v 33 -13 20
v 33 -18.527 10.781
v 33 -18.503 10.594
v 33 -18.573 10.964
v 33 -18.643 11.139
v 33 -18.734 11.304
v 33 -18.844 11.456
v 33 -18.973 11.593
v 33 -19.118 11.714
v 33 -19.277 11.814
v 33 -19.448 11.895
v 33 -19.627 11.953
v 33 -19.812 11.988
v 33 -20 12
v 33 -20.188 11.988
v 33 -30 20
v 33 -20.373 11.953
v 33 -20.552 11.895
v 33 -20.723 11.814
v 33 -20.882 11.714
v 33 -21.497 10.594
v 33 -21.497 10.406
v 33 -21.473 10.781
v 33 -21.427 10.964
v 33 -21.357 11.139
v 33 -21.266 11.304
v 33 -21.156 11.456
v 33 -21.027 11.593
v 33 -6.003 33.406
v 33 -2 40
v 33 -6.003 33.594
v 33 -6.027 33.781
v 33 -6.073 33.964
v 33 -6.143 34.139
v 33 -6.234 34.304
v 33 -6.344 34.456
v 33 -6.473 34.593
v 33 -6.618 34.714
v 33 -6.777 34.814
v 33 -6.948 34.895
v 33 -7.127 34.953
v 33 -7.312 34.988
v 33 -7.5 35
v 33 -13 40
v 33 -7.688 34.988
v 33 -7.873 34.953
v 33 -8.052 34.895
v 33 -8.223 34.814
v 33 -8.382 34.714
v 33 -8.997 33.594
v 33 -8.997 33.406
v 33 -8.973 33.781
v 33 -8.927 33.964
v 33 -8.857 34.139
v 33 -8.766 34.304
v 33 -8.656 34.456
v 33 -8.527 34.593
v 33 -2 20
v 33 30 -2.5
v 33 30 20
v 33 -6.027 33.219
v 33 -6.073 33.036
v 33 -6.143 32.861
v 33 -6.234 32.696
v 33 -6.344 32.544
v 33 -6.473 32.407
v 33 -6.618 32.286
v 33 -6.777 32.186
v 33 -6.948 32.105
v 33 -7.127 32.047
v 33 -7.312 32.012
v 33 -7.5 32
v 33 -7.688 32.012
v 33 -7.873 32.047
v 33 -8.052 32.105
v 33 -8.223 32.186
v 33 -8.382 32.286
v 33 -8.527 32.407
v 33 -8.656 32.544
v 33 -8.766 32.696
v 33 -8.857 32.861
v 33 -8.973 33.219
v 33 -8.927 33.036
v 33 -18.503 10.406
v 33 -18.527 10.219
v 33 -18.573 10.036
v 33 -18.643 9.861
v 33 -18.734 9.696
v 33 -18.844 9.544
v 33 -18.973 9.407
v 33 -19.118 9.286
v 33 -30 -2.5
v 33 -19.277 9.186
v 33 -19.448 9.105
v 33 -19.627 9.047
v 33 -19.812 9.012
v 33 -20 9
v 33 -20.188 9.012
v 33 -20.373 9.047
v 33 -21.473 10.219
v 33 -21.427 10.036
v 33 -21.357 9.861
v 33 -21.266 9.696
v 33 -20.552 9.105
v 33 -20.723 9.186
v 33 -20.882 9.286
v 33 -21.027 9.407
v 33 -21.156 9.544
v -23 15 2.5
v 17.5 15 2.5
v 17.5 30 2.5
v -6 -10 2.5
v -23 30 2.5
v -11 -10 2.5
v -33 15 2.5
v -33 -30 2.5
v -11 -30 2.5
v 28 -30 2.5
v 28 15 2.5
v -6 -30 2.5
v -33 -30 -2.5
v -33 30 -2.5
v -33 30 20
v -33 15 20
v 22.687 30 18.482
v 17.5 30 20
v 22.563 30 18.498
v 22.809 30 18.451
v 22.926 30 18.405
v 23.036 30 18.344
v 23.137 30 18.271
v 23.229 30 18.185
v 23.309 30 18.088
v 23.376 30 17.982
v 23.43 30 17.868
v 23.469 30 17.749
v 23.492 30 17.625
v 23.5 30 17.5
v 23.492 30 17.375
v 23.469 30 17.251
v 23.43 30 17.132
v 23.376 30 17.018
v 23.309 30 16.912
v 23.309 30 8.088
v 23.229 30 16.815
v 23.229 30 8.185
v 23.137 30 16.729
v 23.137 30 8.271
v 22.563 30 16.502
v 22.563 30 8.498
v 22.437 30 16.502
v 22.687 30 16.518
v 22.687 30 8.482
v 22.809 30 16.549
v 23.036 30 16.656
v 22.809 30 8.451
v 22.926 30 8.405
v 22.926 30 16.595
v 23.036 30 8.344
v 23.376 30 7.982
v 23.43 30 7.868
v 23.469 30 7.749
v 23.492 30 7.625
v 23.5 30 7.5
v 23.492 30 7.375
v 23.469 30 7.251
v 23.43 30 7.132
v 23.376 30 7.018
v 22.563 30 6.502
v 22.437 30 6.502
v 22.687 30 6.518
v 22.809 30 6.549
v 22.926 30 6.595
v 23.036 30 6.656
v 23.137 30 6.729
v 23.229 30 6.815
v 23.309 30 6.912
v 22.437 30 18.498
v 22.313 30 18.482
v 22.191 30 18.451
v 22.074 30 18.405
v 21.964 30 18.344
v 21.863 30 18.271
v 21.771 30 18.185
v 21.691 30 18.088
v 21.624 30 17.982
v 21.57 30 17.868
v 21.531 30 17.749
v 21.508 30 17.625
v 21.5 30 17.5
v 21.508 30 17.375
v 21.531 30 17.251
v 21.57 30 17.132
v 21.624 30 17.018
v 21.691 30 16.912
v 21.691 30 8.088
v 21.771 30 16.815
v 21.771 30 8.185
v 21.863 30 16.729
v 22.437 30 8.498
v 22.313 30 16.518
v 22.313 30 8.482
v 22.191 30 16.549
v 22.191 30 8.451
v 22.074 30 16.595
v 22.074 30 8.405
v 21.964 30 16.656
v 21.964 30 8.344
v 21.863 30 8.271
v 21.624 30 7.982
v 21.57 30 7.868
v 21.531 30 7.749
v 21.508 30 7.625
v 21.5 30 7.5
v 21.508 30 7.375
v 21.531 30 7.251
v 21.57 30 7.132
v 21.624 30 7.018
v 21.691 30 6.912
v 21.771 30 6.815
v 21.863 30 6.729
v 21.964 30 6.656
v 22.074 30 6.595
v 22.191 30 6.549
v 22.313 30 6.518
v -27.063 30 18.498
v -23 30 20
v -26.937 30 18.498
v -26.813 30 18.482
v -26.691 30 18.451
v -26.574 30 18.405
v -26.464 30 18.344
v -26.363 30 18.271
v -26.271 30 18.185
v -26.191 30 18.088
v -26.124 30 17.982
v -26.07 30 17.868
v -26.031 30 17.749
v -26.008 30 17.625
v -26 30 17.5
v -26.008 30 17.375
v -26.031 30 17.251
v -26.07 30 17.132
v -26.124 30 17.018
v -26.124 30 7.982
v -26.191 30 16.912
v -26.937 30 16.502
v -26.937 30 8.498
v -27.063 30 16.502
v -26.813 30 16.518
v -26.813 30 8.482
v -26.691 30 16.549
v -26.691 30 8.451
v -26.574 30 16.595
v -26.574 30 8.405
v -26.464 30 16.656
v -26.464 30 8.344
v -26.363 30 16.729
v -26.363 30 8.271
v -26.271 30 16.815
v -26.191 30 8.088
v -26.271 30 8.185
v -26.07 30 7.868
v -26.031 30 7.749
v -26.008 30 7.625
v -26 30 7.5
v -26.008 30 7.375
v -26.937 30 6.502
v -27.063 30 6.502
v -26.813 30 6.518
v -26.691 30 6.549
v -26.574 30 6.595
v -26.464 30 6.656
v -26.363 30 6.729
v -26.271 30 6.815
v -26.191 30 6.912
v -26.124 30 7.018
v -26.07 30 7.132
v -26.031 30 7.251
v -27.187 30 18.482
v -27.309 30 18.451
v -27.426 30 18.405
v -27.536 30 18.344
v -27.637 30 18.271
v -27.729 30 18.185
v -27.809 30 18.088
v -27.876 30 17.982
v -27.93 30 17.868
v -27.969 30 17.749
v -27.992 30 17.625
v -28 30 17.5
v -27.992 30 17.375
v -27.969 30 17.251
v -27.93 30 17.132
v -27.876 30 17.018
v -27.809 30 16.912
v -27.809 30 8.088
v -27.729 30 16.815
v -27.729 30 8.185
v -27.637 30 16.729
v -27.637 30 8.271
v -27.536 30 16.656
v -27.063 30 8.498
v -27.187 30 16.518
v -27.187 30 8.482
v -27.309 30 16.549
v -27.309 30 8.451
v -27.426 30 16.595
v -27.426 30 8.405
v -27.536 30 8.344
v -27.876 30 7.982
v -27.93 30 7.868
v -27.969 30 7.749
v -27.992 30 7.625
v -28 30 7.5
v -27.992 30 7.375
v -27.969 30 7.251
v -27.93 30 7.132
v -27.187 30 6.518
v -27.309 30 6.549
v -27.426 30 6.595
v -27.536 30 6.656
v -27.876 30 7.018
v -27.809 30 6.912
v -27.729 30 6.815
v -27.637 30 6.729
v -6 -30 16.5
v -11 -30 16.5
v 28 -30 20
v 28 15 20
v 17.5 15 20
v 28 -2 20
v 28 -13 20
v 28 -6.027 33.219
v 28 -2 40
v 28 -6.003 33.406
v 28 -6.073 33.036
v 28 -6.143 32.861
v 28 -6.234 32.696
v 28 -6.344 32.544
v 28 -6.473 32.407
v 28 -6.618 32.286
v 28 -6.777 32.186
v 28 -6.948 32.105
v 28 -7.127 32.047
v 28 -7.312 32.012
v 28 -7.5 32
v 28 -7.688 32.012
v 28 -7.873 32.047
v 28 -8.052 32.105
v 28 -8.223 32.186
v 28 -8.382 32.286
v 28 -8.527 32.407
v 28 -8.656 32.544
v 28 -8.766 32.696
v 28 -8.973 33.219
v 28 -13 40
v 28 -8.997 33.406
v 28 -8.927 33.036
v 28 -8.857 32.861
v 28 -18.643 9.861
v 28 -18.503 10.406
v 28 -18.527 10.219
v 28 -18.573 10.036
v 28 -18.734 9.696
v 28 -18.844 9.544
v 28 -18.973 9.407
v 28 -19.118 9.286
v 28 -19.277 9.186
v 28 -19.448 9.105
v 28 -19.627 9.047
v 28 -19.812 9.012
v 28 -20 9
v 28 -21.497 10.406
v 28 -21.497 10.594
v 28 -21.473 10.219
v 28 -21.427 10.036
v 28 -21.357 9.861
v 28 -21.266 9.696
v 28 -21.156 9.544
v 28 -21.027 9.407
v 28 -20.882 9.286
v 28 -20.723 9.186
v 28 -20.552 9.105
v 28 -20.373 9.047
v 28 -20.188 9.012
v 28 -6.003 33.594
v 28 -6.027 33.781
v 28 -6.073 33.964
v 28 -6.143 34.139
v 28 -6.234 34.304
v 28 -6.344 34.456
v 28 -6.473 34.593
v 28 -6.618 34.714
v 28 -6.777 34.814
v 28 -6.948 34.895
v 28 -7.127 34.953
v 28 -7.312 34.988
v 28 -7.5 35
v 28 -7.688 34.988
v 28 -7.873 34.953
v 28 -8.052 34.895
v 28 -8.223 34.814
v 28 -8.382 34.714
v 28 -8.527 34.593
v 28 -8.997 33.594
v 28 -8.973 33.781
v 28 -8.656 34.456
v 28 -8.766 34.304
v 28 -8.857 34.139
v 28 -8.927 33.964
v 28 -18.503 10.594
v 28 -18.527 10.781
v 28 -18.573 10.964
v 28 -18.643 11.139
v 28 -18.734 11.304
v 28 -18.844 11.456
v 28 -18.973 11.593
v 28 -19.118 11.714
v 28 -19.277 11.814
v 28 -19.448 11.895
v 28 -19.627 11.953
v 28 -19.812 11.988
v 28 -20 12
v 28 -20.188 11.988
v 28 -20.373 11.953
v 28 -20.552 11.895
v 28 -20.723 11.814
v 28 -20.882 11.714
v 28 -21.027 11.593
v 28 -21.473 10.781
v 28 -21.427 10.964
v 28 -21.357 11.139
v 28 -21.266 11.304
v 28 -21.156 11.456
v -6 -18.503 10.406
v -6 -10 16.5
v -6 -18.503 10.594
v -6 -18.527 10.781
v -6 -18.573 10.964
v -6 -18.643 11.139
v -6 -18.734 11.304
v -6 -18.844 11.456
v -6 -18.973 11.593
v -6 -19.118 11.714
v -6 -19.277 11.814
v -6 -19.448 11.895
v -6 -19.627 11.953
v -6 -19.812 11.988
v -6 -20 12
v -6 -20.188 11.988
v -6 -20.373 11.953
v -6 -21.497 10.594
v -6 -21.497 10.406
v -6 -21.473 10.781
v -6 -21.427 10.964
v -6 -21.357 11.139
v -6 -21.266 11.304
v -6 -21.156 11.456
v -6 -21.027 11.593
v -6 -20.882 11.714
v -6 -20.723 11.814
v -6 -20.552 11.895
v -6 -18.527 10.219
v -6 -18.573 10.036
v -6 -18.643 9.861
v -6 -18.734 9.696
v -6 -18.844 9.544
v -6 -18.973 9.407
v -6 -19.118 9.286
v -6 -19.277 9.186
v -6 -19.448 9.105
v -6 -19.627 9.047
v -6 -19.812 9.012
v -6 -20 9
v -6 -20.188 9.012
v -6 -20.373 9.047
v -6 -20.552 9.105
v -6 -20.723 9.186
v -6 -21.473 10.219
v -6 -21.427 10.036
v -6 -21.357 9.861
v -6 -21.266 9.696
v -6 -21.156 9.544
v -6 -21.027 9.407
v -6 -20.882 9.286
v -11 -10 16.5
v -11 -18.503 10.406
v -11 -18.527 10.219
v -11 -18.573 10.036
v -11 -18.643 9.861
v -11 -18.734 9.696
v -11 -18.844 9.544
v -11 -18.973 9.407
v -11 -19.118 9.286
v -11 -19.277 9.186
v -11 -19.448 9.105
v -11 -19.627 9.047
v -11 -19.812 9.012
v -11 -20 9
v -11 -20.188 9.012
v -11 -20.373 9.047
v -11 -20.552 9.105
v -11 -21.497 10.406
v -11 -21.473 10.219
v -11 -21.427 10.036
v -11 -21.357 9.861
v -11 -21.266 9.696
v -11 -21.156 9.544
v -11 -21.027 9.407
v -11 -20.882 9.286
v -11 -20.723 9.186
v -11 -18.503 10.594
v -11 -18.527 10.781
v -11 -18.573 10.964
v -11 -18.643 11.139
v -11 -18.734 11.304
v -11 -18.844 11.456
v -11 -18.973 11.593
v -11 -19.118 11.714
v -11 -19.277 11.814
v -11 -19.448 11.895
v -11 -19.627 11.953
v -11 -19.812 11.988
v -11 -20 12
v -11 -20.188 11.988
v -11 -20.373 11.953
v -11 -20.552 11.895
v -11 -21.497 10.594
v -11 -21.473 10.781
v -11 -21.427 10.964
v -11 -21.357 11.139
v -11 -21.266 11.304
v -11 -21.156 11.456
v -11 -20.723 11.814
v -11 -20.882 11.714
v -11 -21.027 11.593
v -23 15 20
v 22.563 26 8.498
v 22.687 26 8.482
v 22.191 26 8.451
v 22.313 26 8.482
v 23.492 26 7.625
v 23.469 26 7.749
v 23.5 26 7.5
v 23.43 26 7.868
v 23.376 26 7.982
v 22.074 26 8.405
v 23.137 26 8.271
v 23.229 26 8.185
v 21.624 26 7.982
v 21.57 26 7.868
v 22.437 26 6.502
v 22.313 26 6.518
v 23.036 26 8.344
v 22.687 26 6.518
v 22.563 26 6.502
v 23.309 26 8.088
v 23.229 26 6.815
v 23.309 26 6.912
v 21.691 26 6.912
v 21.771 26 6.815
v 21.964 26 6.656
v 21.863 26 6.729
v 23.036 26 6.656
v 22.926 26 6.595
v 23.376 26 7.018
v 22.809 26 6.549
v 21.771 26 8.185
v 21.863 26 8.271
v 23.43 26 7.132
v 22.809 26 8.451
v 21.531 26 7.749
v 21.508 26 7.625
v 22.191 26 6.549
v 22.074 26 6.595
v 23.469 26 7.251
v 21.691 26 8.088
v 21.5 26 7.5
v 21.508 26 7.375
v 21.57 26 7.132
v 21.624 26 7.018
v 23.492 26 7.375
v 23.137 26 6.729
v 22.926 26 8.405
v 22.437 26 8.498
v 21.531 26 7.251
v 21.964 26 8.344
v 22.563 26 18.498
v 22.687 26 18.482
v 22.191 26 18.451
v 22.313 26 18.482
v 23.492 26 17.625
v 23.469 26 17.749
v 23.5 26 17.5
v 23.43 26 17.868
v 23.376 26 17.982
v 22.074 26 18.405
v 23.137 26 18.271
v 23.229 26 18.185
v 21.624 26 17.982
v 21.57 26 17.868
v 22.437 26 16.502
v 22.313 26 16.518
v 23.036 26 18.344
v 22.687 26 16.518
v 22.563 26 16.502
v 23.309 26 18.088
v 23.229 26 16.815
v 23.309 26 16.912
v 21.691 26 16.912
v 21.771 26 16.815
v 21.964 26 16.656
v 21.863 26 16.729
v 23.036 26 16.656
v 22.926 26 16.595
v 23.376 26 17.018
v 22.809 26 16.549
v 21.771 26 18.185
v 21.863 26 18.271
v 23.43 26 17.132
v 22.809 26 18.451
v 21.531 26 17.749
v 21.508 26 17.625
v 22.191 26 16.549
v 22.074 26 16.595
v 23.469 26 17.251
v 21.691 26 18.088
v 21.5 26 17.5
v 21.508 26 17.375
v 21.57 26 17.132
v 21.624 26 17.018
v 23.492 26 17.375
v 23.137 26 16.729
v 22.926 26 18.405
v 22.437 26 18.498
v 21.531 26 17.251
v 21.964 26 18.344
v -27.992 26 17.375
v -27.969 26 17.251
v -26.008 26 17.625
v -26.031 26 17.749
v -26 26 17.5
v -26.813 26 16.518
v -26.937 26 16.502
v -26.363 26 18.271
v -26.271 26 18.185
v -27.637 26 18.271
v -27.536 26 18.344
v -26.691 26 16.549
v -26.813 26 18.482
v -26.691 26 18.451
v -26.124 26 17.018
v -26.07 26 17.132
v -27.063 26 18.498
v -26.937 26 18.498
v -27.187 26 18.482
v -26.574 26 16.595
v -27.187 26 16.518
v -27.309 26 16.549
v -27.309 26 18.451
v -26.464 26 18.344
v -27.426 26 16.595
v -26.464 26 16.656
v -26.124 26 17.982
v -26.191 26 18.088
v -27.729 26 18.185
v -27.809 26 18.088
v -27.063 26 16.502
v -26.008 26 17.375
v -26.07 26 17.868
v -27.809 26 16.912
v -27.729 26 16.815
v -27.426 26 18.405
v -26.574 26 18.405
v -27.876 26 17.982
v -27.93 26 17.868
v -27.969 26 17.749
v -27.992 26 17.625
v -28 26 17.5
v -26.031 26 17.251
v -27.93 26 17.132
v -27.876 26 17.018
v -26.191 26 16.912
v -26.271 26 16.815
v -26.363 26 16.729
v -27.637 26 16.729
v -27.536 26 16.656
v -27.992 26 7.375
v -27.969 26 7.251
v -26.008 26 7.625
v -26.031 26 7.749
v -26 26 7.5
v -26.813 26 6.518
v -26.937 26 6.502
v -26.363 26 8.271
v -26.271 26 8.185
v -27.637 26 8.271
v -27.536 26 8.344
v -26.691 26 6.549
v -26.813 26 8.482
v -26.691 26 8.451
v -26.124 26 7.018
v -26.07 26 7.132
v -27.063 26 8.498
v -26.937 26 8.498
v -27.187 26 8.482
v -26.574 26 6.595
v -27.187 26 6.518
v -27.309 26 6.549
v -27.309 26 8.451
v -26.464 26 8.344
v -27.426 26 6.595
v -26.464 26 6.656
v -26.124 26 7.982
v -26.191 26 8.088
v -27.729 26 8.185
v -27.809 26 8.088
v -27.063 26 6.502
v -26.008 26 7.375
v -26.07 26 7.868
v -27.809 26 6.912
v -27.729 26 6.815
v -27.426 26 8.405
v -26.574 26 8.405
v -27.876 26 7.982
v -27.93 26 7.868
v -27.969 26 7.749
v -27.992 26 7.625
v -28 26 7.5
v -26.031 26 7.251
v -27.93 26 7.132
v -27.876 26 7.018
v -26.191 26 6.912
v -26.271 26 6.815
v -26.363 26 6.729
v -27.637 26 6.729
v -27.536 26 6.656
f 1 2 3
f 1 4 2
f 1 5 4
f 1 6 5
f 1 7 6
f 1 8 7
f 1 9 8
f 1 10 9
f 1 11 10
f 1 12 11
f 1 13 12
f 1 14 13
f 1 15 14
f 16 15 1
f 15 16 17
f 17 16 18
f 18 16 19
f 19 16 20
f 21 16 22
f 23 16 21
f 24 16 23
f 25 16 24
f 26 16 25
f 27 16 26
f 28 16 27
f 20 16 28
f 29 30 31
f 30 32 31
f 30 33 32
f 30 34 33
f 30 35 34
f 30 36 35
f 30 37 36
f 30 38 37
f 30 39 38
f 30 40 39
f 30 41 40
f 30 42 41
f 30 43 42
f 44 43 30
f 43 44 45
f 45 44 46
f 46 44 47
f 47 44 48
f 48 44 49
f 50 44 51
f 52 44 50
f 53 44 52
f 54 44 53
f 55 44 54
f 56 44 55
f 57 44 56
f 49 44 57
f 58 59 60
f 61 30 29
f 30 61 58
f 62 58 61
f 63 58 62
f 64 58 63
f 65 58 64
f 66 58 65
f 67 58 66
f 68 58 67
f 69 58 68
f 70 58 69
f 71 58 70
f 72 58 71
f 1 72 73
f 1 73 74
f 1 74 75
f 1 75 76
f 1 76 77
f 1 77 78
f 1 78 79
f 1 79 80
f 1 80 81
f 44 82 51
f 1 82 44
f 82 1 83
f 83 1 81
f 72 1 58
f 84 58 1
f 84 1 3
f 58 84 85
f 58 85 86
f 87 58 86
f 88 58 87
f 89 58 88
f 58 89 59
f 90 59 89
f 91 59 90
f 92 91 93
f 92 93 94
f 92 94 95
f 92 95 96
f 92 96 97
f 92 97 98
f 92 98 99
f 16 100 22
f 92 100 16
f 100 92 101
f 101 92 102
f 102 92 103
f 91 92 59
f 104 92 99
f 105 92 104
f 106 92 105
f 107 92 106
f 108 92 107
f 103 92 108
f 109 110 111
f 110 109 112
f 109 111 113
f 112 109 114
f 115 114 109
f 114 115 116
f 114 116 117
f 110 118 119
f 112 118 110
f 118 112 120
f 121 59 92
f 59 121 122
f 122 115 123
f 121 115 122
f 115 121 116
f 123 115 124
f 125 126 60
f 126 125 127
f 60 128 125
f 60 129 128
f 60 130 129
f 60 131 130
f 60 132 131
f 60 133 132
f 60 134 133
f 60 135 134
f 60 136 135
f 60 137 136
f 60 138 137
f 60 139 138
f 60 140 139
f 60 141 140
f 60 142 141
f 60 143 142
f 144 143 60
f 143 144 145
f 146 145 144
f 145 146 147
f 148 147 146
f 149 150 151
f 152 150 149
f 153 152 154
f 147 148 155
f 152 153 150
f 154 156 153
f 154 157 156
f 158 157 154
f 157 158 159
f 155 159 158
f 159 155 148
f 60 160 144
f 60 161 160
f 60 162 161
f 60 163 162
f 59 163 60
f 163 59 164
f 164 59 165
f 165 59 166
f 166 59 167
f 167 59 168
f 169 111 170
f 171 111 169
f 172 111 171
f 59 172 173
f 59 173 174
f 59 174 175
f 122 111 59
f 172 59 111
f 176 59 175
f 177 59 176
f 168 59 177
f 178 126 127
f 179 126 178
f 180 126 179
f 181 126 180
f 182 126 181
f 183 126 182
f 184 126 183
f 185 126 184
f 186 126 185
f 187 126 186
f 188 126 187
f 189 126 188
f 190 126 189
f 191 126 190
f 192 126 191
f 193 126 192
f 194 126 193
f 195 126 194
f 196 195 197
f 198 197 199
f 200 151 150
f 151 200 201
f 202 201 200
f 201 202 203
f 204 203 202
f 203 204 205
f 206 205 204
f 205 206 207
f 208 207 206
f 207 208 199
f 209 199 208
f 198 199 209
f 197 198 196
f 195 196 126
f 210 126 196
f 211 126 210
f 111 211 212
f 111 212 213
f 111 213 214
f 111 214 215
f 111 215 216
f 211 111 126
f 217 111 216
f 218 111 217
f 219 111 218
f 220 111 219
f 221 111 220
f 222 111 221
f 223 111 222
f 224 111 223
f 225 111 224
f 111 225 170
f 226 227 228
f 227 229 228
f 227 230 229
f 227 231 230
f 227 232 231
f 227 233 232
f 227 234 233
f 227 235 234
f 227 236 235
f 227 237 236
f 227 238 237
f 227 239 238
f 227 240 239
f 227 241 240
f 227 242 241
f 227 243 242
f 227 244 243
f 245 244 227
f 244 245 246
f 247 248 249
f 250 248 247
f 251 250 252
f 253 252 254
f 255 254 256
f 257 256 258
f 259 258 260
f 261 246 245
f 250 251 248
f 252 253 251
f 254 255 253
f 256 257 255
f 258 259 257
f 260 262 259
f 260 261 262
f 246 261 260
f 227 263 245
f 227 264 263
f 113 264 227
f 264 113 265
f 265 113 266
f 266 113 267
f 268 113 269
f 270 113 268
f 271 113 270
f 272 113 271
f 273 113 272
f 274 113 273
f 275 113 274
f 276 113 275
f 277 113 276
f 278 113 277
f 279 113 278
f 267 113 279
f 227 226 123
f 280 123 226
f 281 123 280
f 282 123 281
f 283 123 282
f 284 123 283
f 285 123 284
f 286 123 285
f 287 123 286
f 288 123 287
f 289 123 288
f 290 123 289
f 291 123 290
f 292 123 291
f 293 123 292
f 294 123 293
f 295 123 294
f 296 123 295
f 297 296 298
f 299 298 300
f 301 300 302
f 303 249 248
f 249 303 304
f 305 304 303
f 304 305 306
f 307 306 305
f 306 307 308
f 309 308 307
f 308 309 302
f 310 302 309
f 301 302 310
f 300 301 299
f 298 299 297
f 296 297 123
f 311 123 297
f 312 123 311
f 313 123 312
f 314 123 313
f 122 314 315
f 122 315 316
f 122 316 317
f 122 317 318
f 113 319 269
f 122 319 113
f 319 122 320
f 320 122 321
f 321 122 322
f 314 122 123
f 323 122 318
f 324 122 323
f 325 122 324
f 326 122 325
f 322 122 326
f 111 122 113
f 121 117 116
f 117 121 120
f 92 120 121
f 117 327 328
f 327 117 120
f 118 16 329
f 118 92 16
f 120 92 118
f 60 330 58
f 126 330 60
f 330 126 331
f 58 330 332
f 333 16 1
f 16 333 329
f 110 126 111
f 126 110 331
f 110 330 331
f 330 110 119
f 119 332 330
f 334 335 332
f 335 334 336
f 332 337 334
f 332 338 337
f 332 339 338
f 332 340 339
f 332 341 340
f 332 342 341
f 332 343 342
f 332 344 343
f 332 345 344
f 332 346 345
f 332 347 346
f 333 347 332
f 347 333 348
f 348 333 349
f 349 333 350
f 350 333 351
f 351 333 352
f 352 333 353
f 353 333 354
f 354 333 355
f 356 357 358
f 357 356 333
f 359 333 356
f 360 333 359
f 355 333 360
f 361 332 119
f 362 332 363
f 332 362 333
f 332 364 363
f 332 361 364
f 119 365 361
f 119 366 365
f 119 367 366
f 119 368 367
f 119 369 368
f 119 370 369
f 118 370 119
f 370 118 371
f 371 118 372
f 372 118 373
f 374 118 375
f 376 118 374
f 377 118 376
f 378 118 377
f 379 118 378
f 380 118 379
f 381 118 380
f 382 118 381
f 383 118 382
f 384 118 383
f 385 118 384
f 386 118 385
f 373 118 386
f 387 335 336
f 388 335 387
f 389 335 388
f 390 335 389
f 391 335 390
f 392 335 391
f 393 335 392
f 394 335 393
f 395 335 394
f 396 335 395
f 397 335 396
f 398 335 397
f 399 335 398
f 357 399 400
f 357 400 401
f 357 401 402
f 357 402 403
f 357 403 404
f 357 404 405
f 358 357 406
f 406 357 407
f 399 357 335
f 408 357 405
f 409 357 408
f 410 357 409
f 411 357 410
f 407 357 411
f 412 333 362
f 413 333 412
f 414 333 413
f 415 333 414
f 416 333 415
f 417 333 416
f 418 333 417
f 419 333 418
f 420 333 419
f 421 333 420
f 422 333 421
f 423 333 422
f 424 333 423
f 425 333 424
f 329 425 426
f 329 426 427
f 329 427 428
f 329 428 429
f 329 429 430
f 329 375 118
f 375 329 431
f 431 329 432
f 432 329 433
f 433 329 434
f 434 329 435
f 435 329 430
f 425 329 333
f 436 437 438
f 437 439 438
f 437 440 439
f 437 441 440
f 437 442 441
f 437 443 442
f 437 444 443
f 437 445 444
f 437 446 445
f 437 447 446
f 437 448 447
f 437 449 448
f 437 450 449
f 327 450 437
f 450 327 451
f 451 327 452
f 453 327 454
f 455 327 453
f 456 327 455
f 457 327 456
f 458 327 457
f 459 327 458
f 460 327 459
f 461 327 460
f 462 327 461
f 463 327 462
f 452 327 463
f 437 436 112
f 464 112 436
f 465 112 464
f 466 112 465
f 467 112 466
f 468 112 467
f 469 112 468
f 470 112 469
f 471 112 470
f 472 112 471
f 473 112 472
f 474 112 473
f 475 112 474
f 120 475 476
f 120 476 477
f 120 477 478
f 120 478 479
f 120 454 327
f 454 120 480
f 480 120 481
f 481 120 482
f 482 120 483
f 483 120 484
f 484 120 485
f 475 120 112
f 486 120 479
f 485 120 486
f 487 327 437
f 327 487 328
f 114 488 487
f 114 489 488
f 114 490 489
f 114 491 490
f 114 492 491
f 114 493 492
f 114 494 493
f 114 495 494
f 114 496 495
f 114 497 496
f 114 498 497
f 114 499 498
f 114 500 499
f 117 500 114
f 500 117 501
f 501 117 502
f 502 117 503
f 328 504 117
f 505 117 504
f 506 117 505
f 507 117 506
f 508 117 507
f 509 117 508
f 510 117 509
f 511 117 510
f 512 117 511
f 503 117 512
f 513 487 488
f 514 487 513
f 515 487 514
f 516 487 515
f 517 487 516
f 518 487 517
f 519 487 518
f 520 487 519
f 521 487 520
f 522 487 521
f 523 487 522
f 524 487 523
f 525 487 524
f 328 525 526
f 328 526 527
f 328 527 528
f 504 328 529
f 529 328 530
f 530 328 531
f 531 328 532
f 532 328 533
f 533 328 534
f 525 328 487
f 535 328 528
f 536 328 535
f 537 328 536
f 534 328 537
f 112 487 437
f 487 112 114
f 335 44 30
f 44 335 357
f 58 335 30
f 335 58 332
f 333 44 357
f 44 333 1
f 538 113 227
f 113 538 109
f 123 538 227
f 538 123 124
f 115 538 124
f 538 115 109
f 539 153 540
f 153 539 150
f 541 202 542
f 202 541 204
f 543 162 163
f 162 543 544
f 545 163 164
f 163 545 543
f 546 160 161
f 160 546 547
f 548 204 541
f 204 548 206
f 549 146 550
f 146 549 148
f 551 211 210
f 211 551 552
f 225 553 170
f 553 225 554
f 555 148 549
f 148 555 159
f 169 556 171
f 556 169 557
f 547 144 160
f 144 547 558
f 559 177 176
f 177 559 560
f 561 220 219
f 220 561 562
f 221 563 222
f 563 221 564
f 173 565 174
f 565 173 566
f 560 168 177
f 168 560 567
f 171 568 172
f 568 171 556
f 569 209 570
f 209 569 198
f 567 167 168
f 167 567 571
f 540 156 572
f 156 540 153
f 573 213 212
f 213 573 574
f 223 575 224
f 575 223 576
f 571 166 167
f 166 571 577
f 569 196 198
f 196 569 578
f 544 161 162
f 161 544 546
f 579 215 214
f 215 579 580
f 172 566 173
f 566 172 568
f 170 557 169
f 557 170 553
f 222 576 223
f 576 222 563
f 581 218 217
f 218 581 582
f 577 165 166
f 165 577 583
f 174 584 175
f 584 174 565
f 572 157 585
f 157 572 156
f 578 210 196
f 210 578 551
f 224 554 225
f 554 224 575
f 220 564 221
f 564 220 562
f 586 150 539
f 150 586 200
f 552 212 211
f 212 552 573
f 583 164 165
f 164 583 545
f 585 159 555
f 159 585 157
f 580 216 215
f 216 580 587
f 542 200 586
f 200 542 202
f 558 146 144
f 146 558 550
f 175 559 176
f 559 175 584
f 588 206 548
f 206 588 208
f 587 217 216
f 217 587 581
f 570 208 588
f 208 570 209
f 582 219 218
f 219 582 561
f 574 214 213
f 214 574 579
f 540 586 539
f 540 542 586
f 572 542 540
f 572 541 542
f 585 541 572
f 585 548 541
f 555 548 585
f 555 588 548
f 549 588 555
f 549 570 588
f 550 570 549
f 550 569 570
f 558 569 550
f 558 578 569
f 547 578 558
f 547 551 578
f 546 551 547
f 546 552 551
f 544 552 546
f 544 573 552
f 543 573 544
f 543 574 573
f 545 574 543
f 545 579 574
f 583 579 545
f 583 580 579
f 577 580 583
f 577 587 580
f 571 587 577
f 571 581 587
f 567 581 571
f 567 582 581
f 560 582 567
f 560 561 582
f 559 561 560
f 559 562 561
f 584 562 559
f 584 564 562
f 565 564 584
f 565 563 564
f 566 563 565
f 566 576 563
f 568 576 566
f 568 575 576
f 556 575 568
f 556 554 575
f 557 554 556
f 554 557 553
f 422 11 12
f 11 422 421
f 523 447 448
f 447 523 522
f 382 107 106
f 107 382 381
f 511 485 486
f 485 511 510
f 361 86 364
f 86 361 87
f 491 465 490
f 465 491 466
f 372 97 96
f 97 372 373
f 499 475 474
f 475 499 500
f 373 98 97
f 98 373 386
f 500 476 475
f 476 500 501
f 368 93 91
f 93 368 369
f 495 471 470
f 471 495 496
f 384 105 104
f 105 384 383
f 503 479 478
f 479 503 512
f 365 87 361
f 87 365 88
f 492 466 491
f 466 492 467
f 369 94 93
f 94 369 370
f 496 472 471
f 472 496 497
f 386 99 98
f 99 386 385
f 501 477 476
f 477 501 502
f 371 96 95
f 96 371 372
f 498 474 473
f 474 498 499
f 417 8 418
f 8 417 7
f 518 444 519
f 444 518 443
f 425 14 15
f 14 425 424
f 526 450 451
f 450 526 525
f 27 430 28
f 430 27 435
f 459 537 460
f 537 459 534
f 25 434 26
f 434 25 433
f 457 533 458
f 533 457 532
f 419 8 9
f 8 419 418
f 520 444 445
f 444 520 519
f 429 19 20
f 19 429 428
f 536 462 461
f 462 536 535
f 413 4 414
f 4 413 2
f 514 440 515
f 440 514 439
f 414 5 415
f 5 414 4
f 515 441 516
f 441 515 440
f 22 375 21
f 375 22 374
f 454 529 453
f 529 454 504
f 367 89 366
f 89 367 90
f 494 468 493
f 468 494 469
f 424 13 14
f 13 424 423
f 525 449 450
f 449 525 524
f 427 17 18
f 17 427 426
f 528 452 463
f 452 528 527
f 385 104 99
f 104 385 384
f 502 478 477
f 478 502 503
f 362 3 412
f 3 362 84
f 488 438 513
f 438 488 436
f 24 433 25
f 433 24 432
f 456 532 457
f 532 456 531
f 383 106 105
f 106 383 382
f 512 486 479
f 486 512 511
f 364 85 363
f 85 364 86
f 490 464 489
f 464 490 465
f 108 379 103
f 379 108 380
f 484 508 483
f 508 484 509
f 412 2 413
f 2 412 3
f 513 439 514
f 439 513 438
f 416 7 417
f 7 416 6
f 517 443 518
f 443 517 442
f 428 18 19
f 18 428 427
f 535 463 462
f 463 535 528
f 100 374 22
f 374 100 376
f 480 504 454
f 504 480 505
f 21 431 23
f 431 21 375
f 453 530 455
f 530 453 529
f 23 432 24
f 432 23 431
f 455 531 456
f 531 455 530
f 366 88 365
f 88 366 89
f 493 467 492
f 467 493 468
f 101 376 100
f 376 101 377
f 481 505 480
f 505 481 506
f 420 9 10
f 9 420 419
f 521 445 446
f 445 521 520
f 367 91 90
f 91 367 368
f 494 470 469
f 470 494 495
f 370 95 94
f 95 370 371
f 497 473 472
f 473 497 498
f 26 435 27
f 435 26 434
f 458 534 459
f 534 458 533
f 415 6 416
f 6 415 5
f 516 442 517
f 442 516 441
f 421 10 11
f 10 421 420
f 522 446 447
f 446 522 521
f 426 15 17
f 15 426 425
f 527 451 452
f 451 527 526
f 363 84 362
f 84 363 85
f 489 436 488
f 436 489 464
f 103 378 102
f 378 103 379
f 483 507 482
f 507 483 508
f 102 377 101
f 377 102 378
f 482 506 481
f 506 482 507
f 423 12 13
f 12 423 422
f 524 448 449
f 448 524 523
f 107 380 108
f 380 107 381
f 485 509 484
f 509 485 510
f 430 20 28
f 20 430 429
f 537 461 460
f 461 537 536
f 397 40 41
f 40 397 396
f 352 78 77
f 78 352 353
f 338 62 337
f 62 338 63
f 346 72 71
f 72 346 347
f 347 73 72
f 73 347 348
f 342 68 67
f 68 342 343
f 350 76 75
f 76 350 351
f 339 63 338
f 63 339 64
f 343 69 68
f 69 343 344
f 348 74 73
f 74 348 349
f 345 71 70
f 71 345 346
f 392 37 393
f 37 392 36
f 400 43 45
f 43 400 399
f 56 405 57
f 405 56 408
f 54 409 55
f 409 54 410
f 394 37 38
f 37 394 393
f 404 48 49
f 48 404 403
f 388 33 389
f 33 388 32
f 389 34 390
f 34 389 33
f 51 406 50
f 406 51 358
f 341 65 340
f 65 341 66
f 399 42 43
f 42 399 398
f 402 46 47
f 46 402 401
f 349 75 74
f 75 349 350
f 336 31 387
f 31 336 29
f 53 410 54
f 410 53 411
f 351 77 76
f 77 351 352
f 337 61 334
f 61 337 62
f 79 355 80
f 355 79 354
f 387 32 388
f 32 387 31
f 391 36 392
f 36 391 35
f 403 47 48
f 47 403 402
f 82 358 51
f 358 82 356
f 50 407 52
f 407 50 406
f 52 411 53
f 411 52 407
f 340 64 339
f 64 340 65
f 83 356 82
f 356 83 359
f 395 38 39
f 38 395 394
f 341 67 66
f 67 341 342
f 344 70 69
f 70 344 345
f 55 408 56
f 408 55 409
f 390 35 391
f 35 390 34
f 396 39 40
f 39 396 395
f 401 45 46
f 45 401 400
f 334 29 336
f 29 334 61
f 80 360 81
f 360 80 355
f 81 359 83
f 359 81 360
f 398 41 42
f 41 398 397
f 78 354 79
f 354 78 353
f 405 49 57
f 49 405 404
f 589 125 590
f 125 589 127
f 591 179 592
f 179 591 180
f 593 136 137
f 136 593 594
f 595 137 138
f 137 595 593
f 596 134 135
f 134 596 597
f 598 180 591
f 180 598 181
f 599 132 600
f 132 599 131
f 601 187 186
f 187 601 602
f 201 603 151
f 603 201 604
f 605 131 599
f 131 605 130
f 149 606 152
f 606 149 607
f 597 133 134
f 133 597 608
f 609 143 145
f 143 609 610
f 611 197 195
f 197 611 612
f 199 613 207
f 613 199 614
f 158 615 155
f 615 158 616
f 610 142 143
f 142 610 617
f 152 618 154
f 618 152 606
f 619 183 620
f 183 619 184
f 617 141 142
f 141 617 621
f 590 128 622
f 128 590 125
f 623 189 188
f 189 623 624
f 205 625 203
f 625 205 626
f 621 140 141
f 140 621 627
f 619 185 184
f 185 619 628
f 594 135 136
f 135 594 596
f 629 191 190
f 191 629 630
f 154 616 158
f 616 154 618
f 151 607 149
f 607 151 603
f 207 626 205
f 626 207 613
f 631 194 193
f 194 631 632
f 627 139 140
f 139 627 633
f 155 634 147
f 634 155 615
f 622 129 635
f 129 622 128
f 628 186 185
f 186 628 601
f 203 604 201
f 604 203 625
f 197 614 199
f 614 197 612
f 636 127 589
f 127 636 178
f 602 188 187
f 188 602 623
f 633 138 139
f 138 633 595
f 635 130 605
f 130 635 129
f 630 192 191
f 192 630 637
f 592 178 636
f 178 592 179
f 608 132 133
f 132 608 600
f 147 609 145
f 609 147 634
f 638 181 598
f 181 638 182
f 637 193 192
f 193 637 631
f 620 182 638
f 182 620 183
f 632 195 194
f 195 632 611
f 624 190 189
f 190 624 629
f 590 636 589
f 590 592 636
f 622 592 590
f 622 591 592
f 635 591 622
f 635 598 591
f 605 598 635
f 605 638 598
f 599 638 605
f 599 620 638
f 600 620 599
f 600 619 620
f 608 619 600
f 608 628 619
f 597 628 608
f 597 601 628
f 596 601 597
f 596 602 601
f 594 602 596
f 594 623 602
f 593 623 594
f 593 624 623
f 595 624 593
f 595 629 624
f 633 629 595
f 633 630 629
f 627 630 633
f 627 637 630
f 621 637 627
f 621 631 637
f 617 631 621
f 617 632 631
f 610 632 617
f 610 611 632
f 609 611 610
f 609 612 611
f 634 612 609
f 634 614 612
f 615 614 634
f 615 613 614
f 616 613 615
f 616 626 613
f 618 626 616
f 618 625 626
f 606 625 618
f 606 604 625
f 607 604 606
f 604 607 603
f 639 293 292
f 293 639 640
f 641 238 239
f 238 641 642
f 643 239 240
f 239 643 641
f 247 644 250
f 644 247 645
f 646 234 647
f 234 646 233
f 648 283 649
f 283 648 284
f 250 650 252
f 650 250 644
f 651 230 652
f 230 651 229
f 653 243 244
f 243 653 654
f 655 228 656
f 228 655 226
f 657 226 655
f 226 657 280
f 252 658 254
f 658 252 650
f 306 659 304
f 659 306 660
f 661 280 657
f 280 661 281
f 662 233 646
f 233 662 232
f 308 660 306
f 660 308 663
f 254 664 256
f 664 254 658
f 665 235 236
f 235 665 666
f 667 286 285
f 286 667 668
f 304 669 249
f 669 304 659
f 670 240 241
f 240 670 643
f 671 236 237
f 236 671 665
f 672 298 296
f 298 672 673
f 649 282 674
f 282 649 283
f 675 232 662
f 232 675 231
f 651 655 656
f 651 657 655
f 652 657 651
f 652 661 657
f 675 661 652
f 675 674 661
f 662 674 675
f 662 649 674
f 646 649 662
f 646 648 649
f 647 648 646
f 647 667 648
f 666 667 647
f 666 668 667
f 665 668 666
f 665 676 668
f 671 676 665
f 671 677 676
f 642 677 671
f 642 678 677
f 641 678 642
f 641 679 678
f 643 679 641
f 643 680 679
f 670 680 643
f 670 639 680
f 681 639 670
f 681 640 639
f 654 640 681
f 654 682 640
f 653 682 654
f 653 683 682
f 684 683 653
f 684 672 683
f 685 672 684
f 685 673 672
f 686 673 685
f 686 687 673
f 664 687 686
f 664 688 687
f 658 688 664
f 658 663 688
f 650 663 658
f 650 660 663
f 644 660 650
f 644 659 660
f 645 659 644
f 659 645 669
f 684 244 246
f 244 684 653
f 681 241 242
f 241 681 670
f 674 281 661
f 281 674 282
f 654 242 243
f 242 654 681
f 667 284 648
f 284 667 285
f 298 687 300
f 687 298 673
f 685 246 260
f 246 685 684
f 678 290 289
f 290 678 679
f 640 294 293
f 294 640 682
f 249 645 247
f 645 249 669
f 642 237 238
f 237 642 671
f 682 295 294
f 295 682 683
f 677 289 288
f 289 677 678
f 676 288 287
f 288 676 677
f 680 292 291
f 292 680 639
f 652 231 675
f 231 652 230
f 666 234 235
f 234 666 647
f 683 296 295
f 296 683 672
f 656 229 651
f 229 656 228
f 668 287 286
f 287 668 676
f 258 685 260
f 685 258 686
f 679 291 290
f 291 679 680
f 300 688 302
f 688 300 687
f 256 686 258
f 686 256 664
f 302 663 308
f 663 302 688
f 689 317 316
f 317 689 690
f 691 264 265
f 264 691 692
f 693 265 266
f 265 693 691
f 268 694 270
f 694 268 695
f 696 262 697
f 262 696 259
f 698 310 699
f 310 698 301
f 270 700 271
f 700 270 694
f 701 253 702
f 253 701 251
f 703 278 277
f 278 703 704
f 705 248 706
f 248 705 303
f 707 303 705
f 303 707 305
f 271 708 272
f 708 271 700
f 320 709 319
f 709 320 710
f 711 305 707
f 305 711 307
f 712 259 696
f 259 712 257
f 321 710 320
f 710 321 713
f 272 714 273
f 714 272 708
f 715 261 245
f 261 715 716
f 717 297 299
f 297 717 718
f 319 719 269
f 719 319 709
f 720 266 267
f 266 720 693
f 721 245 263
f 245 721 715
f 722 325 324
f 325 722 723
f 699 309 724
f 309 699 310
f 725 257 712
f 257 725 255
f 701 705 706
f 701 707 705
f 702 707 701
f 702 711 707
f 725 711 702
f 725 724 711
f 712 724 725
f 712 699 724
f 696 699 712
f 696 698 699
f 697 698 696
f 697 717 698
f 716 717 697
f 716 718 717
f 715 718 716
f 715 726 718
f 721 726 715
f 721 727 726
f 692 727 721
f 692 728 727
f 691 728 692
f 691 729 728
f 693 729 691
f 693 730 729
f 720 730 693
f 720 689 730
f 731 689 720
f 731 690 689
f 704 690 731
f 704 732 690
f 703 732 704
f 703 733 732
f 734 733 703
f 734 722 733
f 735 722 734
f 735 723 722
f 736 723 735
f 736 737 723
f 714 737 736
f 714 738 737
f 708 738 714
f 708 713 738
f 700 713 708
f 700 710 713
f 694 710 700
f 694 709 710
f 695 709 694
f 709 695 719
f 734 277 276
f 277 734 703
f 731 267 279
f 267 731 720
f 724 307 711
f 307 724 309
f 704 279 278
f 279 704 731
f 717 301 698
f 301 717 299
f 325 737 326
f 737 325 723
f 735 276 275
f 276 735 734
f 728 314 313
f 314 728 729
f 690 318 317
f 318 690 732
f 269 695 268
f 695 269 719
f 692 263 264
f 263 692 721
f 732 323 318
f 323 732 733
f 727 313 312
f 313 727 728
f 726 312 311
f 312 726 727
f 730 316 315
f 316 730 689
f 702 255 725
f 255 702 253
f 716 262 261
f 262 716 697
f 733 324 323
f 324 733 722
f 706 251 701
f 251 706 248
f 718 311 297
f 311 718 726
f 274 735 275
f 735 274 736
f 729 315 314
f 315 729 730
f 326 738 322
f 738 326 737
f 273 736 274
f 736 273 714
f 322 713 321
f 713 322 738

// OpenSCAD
    //Author: Piotr Paterek, Kraków 05-08.2016
    $fn=50;
    module base()
    {
        cube([66,60,5], center=true);
        translate([25,22.5,10])
        {
            cube([15,15,20], center=true);
        }
        translate([30.5,0,10])
        {
            cube([5,60,20], center=true);
        }
        translate([-8.5,-20,9])
        {
            cube([5,20,15], center=true);
        }
        translate([28,-13,0])
        {
            cube([5,11,40]);
        }
        translate([-28,22.5,10])
        {
            cube([10,15,20],center=true);
           }   
    }
   difference()
    {  
    difference()
    {
        difference()
    {
        difference()
    {
        difference()
        {
            difference()
            {
                difference()
                {
                    difference()
                    {
                    base();
                    translate([22.5,30,7.5])
                    {
                        rotate(a=90, v=[1,0,0])
                        {
                            cylinder(r=1,h=4);
                        }
                    }
                }
                translate([-19.5,15,10])
                    {
                        rotate(a=90, v=[1,0,0])
                        {
                            cylinder(r=1,h=4);
                        }
                    }
            }
        translate([-27,-20,10.5])
                    {
                        rotate(a=90, v=[0,1,0])
                        {
                            cylinder(r=1.5,h=60);
                        }
                    }
            }
             translate([28,-7.5,33.5])
                    {
                        rotate(a=90, v=[0,1,0])
                        {
                            cylinder(r=1.5,h=60);
                        }
                    }
            }
            translate([22.5,30,17.5])
                    {
                        rotate(a=90, v=[1,0,0])
                        {
                            cylinder(r=1,h=4);
                        }
                    }
                }
                
            
            translate([-27,30,17.5])
                    {
                        rotate(a=90, v=[1,0,0])
                        {
                            cylinder(r=1,h=4);
                        }
                    }
                }
                translate([-27,30,7.5])
                    {
                        rotate(a=90, v=[1,0,0])
                        {
                            cylinder(r=1,h=4);
                        }
                    }
                }
            }
